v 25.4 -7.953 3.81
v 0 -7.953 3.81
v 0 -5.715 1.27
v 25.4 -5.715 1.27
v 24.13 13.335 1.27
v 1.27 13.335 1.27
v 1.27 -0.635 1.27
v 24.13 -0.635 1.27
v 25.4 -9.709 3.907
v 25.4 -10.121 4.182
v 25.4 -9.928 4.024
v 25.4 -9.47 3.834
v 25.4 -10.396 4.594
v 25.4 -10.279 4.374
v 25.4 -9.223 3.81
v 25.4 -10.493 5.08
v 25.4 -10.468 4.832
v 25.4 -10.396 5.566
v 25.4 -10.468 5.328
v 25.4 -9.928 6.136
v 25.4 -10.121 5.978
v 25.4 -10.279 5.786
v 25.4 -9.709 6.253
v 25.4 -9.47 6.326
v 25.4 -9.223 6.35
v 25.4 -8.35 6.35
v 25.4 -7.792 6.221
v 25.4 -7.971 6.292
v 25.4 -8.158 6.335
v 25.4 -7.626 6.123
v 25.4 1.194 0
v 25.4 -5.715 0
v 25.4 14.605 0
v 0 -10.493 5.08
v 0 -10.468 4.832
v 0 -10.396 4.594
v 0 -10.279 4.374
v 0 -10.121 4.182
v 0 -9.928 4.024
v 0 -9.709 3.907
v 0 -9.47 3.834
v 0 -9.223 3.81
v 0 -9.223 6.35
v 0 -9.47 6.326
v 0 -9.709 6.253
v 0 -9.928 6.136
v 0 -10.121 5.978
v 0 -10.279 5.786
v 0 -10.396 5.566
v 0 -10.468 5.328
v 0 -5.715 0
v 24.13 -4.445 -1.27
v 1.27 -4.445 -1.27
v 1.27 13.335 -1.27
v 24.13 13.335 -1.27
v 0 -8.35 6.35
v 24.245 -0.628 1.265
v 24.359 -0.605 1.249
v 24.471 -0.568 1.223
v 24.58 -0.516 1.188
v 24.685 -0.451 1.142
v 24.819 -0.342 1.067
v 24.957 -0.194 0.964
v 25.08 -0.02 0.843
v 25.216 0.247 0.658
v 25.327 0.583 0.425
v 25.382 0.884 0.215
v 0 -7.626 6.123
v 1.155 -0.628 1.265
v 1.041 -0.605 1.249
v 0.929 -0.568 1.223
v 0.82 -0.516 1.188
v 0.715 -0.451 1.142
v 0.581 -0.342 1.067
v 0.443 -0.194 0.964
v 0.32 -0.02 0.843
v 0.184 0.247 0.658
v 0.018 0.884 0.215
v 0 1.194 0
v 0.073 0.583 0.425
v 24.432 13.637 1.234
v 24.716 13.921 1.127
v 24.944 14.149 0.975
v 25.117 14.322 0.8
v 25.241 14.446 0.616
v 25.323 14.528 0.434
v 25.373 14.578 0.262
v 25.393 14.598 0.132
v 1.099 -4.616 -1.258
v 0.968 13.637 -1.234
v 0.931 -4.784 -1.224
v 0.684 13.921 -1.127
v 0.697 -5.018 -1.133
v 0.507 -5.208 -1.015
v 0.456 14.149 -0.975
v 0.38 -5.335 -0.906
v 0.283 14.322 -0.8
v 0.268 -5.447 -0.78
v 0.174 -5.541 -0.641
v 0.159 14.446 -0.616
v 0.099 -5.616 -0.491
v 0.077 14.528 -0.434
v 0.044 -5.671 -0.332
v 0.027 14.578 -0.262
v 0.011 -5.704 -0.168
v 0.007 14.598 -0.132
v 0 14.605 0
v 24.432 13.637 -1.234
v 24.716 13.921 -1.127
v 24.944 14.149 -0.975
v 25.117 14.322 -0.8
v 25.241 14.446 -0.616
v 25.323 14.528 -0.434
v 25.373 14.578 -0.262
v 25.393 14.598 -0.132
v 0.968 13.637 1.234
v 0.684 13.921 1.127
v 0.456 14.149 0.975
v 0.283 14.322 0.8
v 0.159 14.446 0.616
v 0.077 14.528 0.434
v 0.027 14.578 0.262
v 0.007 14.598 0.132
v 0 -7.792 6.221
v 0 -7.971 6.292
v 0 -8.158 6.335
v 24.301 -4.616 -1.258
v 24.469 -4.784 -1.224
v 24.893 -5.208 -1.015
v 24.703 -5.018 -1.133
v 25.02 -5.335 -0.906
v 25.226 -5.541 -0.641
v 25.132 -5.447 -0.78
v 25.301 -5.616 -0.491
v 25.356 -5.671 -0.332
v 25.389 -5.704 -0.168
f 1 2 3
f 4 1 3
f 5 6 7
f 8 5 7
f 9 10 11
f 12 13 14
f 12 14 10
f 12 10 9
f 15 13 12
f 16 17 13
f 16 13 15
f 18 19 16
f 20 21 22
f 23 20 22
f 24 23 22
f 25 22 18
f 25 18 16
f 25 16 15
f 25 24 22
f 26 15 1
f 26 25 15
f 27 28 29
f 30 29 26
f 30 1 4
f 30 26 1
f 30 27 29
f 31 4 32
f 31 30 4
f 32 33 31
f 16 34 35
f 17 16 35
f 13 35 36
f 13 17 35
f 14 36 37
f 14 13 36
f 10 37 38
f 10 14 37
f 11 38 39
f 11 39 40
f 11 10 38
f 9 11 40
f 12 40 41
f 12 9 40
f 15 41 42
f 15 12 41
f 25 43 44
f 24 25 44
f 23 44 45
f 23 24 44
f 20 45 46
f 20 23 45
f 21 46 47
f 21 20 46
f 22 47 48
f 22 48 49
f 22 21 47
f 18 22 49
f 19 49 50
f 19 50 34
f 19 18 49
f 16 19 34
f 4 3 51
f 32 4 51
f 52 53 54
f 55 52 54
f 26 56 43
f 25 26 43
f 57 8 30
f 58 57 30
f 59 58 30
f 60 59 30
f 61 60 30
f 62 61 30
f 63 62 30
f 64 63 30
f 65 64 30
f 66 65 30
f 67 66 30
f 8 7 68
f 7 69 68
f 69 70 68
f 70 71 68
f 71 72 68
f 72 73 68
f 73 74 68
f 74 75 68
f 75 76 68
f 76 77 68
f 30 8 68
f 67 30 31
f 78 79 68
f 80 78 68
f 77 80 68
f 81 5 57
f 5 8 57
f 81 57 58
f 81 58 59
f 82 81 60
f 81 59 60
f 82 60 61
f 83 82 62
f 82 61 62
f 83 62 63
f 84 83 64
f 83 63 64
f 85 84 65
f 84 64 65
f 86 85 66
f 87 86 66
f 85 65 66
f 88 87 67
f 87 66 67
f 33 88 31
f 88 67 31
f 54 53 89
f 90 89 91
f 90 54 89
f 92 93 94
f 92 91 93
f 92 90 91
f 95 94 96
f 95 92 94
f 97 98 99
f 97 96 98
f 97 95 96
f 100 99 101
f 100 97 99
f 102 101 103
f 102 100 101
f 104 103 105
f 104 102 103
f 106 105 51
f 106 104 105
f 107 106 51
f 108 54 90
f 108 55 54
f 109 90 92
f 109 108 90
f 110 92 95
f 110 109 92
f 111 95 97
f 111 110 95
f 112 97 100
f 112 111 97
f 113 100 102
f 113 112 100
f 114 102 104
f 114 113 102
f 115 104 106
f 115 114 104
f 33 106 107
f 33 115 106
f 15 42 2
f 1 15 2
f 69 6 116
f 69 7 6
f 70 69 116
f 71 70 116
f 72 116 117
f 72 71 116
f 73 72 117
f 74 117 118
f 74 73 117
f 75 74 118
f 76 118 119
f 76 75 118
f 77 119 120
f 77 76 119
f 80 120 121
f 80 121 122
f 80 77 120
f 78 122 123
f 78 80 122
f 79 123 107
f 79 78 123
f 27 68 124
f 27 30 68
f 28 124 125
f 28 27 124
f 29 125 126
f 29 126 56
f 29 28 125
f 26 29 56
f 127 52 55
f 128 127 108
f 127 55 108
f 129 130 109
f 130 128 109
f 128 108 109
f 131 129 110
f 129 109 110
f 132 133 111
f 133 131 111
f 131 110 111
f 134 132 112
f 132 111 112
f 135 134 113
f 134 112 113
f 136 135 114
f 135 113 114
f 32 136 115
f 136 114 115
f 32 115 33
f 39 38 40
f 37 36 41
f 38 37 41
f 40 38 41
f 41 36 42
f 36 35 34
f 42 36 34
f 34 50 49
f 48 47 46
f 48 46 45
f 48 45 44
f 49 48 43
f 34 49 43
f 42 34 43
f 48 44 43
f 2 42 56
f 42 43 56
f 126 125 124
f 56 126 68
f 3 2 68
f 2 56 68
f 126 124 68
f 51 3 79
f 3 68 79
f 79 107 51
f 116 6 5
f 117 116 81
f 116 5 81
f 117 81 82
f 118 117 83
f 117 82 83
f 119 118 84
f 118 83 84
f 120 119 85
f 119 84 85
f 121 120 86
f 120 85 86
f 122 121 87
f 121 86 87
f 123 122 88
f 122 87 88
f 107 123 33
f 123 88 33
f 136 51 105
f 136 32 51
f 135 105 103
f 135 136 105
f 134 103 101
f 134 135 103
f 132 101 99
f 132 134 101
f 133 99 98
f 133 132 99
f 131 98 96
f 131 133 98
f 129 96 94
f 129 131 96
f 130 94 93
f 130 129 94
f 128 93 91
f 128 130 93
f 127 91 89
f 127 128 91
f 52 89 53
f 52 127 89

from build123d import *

# Parameters (mm, degrees)
F1_DEPTH = 25.4
F2_R     = 1.26999


# Not quite as in the source:
# - a fillet or chamfer is up to 0.001 mm smaller than in the source, because OpenCascade refuses the exact size


with BuildPart() as f1:
    # F0 (on Right) → F1 (new body)
    with BuildSketch(Plane.YZ):
        Polygon((14.605, 1.27), (-0.635, 1.27), (-7.9526191413, 6.35), (-10.4926191413, 6.35), (-10.4926191413, 3.81), (-7.9526191413, 3.81), (-5.715, 1.27), (-5.715, -1.27), (14.605, -1.27), align=None)
    extrude(amount=F1_DEPTH)

    # F2 (radius 1.27 in the source; OpenCascade refuses exactly that, so slightly less here)
    f2_edges = [f1.edges().sort_by_distance(p)[0] for p in [
        (12.7, -10.492619, 6.35),
        (12.7, -7.952619, 6.35),
        (12.7, -10.492619, 3.81),
        (12.7, 14.605, 1.27),
        (12.7, 14.605, -1.27),
        (12.7, -5.715, -1.27),
        (25.4, 6.985, 1.27),
        (0, 6.985, 1.27),
        (25.4, 4.445, -1.27),
        (0, 4.445, -1.27),
    ]]
    fillet(f2_edges, radius=F2_R)


solid = f1.part
